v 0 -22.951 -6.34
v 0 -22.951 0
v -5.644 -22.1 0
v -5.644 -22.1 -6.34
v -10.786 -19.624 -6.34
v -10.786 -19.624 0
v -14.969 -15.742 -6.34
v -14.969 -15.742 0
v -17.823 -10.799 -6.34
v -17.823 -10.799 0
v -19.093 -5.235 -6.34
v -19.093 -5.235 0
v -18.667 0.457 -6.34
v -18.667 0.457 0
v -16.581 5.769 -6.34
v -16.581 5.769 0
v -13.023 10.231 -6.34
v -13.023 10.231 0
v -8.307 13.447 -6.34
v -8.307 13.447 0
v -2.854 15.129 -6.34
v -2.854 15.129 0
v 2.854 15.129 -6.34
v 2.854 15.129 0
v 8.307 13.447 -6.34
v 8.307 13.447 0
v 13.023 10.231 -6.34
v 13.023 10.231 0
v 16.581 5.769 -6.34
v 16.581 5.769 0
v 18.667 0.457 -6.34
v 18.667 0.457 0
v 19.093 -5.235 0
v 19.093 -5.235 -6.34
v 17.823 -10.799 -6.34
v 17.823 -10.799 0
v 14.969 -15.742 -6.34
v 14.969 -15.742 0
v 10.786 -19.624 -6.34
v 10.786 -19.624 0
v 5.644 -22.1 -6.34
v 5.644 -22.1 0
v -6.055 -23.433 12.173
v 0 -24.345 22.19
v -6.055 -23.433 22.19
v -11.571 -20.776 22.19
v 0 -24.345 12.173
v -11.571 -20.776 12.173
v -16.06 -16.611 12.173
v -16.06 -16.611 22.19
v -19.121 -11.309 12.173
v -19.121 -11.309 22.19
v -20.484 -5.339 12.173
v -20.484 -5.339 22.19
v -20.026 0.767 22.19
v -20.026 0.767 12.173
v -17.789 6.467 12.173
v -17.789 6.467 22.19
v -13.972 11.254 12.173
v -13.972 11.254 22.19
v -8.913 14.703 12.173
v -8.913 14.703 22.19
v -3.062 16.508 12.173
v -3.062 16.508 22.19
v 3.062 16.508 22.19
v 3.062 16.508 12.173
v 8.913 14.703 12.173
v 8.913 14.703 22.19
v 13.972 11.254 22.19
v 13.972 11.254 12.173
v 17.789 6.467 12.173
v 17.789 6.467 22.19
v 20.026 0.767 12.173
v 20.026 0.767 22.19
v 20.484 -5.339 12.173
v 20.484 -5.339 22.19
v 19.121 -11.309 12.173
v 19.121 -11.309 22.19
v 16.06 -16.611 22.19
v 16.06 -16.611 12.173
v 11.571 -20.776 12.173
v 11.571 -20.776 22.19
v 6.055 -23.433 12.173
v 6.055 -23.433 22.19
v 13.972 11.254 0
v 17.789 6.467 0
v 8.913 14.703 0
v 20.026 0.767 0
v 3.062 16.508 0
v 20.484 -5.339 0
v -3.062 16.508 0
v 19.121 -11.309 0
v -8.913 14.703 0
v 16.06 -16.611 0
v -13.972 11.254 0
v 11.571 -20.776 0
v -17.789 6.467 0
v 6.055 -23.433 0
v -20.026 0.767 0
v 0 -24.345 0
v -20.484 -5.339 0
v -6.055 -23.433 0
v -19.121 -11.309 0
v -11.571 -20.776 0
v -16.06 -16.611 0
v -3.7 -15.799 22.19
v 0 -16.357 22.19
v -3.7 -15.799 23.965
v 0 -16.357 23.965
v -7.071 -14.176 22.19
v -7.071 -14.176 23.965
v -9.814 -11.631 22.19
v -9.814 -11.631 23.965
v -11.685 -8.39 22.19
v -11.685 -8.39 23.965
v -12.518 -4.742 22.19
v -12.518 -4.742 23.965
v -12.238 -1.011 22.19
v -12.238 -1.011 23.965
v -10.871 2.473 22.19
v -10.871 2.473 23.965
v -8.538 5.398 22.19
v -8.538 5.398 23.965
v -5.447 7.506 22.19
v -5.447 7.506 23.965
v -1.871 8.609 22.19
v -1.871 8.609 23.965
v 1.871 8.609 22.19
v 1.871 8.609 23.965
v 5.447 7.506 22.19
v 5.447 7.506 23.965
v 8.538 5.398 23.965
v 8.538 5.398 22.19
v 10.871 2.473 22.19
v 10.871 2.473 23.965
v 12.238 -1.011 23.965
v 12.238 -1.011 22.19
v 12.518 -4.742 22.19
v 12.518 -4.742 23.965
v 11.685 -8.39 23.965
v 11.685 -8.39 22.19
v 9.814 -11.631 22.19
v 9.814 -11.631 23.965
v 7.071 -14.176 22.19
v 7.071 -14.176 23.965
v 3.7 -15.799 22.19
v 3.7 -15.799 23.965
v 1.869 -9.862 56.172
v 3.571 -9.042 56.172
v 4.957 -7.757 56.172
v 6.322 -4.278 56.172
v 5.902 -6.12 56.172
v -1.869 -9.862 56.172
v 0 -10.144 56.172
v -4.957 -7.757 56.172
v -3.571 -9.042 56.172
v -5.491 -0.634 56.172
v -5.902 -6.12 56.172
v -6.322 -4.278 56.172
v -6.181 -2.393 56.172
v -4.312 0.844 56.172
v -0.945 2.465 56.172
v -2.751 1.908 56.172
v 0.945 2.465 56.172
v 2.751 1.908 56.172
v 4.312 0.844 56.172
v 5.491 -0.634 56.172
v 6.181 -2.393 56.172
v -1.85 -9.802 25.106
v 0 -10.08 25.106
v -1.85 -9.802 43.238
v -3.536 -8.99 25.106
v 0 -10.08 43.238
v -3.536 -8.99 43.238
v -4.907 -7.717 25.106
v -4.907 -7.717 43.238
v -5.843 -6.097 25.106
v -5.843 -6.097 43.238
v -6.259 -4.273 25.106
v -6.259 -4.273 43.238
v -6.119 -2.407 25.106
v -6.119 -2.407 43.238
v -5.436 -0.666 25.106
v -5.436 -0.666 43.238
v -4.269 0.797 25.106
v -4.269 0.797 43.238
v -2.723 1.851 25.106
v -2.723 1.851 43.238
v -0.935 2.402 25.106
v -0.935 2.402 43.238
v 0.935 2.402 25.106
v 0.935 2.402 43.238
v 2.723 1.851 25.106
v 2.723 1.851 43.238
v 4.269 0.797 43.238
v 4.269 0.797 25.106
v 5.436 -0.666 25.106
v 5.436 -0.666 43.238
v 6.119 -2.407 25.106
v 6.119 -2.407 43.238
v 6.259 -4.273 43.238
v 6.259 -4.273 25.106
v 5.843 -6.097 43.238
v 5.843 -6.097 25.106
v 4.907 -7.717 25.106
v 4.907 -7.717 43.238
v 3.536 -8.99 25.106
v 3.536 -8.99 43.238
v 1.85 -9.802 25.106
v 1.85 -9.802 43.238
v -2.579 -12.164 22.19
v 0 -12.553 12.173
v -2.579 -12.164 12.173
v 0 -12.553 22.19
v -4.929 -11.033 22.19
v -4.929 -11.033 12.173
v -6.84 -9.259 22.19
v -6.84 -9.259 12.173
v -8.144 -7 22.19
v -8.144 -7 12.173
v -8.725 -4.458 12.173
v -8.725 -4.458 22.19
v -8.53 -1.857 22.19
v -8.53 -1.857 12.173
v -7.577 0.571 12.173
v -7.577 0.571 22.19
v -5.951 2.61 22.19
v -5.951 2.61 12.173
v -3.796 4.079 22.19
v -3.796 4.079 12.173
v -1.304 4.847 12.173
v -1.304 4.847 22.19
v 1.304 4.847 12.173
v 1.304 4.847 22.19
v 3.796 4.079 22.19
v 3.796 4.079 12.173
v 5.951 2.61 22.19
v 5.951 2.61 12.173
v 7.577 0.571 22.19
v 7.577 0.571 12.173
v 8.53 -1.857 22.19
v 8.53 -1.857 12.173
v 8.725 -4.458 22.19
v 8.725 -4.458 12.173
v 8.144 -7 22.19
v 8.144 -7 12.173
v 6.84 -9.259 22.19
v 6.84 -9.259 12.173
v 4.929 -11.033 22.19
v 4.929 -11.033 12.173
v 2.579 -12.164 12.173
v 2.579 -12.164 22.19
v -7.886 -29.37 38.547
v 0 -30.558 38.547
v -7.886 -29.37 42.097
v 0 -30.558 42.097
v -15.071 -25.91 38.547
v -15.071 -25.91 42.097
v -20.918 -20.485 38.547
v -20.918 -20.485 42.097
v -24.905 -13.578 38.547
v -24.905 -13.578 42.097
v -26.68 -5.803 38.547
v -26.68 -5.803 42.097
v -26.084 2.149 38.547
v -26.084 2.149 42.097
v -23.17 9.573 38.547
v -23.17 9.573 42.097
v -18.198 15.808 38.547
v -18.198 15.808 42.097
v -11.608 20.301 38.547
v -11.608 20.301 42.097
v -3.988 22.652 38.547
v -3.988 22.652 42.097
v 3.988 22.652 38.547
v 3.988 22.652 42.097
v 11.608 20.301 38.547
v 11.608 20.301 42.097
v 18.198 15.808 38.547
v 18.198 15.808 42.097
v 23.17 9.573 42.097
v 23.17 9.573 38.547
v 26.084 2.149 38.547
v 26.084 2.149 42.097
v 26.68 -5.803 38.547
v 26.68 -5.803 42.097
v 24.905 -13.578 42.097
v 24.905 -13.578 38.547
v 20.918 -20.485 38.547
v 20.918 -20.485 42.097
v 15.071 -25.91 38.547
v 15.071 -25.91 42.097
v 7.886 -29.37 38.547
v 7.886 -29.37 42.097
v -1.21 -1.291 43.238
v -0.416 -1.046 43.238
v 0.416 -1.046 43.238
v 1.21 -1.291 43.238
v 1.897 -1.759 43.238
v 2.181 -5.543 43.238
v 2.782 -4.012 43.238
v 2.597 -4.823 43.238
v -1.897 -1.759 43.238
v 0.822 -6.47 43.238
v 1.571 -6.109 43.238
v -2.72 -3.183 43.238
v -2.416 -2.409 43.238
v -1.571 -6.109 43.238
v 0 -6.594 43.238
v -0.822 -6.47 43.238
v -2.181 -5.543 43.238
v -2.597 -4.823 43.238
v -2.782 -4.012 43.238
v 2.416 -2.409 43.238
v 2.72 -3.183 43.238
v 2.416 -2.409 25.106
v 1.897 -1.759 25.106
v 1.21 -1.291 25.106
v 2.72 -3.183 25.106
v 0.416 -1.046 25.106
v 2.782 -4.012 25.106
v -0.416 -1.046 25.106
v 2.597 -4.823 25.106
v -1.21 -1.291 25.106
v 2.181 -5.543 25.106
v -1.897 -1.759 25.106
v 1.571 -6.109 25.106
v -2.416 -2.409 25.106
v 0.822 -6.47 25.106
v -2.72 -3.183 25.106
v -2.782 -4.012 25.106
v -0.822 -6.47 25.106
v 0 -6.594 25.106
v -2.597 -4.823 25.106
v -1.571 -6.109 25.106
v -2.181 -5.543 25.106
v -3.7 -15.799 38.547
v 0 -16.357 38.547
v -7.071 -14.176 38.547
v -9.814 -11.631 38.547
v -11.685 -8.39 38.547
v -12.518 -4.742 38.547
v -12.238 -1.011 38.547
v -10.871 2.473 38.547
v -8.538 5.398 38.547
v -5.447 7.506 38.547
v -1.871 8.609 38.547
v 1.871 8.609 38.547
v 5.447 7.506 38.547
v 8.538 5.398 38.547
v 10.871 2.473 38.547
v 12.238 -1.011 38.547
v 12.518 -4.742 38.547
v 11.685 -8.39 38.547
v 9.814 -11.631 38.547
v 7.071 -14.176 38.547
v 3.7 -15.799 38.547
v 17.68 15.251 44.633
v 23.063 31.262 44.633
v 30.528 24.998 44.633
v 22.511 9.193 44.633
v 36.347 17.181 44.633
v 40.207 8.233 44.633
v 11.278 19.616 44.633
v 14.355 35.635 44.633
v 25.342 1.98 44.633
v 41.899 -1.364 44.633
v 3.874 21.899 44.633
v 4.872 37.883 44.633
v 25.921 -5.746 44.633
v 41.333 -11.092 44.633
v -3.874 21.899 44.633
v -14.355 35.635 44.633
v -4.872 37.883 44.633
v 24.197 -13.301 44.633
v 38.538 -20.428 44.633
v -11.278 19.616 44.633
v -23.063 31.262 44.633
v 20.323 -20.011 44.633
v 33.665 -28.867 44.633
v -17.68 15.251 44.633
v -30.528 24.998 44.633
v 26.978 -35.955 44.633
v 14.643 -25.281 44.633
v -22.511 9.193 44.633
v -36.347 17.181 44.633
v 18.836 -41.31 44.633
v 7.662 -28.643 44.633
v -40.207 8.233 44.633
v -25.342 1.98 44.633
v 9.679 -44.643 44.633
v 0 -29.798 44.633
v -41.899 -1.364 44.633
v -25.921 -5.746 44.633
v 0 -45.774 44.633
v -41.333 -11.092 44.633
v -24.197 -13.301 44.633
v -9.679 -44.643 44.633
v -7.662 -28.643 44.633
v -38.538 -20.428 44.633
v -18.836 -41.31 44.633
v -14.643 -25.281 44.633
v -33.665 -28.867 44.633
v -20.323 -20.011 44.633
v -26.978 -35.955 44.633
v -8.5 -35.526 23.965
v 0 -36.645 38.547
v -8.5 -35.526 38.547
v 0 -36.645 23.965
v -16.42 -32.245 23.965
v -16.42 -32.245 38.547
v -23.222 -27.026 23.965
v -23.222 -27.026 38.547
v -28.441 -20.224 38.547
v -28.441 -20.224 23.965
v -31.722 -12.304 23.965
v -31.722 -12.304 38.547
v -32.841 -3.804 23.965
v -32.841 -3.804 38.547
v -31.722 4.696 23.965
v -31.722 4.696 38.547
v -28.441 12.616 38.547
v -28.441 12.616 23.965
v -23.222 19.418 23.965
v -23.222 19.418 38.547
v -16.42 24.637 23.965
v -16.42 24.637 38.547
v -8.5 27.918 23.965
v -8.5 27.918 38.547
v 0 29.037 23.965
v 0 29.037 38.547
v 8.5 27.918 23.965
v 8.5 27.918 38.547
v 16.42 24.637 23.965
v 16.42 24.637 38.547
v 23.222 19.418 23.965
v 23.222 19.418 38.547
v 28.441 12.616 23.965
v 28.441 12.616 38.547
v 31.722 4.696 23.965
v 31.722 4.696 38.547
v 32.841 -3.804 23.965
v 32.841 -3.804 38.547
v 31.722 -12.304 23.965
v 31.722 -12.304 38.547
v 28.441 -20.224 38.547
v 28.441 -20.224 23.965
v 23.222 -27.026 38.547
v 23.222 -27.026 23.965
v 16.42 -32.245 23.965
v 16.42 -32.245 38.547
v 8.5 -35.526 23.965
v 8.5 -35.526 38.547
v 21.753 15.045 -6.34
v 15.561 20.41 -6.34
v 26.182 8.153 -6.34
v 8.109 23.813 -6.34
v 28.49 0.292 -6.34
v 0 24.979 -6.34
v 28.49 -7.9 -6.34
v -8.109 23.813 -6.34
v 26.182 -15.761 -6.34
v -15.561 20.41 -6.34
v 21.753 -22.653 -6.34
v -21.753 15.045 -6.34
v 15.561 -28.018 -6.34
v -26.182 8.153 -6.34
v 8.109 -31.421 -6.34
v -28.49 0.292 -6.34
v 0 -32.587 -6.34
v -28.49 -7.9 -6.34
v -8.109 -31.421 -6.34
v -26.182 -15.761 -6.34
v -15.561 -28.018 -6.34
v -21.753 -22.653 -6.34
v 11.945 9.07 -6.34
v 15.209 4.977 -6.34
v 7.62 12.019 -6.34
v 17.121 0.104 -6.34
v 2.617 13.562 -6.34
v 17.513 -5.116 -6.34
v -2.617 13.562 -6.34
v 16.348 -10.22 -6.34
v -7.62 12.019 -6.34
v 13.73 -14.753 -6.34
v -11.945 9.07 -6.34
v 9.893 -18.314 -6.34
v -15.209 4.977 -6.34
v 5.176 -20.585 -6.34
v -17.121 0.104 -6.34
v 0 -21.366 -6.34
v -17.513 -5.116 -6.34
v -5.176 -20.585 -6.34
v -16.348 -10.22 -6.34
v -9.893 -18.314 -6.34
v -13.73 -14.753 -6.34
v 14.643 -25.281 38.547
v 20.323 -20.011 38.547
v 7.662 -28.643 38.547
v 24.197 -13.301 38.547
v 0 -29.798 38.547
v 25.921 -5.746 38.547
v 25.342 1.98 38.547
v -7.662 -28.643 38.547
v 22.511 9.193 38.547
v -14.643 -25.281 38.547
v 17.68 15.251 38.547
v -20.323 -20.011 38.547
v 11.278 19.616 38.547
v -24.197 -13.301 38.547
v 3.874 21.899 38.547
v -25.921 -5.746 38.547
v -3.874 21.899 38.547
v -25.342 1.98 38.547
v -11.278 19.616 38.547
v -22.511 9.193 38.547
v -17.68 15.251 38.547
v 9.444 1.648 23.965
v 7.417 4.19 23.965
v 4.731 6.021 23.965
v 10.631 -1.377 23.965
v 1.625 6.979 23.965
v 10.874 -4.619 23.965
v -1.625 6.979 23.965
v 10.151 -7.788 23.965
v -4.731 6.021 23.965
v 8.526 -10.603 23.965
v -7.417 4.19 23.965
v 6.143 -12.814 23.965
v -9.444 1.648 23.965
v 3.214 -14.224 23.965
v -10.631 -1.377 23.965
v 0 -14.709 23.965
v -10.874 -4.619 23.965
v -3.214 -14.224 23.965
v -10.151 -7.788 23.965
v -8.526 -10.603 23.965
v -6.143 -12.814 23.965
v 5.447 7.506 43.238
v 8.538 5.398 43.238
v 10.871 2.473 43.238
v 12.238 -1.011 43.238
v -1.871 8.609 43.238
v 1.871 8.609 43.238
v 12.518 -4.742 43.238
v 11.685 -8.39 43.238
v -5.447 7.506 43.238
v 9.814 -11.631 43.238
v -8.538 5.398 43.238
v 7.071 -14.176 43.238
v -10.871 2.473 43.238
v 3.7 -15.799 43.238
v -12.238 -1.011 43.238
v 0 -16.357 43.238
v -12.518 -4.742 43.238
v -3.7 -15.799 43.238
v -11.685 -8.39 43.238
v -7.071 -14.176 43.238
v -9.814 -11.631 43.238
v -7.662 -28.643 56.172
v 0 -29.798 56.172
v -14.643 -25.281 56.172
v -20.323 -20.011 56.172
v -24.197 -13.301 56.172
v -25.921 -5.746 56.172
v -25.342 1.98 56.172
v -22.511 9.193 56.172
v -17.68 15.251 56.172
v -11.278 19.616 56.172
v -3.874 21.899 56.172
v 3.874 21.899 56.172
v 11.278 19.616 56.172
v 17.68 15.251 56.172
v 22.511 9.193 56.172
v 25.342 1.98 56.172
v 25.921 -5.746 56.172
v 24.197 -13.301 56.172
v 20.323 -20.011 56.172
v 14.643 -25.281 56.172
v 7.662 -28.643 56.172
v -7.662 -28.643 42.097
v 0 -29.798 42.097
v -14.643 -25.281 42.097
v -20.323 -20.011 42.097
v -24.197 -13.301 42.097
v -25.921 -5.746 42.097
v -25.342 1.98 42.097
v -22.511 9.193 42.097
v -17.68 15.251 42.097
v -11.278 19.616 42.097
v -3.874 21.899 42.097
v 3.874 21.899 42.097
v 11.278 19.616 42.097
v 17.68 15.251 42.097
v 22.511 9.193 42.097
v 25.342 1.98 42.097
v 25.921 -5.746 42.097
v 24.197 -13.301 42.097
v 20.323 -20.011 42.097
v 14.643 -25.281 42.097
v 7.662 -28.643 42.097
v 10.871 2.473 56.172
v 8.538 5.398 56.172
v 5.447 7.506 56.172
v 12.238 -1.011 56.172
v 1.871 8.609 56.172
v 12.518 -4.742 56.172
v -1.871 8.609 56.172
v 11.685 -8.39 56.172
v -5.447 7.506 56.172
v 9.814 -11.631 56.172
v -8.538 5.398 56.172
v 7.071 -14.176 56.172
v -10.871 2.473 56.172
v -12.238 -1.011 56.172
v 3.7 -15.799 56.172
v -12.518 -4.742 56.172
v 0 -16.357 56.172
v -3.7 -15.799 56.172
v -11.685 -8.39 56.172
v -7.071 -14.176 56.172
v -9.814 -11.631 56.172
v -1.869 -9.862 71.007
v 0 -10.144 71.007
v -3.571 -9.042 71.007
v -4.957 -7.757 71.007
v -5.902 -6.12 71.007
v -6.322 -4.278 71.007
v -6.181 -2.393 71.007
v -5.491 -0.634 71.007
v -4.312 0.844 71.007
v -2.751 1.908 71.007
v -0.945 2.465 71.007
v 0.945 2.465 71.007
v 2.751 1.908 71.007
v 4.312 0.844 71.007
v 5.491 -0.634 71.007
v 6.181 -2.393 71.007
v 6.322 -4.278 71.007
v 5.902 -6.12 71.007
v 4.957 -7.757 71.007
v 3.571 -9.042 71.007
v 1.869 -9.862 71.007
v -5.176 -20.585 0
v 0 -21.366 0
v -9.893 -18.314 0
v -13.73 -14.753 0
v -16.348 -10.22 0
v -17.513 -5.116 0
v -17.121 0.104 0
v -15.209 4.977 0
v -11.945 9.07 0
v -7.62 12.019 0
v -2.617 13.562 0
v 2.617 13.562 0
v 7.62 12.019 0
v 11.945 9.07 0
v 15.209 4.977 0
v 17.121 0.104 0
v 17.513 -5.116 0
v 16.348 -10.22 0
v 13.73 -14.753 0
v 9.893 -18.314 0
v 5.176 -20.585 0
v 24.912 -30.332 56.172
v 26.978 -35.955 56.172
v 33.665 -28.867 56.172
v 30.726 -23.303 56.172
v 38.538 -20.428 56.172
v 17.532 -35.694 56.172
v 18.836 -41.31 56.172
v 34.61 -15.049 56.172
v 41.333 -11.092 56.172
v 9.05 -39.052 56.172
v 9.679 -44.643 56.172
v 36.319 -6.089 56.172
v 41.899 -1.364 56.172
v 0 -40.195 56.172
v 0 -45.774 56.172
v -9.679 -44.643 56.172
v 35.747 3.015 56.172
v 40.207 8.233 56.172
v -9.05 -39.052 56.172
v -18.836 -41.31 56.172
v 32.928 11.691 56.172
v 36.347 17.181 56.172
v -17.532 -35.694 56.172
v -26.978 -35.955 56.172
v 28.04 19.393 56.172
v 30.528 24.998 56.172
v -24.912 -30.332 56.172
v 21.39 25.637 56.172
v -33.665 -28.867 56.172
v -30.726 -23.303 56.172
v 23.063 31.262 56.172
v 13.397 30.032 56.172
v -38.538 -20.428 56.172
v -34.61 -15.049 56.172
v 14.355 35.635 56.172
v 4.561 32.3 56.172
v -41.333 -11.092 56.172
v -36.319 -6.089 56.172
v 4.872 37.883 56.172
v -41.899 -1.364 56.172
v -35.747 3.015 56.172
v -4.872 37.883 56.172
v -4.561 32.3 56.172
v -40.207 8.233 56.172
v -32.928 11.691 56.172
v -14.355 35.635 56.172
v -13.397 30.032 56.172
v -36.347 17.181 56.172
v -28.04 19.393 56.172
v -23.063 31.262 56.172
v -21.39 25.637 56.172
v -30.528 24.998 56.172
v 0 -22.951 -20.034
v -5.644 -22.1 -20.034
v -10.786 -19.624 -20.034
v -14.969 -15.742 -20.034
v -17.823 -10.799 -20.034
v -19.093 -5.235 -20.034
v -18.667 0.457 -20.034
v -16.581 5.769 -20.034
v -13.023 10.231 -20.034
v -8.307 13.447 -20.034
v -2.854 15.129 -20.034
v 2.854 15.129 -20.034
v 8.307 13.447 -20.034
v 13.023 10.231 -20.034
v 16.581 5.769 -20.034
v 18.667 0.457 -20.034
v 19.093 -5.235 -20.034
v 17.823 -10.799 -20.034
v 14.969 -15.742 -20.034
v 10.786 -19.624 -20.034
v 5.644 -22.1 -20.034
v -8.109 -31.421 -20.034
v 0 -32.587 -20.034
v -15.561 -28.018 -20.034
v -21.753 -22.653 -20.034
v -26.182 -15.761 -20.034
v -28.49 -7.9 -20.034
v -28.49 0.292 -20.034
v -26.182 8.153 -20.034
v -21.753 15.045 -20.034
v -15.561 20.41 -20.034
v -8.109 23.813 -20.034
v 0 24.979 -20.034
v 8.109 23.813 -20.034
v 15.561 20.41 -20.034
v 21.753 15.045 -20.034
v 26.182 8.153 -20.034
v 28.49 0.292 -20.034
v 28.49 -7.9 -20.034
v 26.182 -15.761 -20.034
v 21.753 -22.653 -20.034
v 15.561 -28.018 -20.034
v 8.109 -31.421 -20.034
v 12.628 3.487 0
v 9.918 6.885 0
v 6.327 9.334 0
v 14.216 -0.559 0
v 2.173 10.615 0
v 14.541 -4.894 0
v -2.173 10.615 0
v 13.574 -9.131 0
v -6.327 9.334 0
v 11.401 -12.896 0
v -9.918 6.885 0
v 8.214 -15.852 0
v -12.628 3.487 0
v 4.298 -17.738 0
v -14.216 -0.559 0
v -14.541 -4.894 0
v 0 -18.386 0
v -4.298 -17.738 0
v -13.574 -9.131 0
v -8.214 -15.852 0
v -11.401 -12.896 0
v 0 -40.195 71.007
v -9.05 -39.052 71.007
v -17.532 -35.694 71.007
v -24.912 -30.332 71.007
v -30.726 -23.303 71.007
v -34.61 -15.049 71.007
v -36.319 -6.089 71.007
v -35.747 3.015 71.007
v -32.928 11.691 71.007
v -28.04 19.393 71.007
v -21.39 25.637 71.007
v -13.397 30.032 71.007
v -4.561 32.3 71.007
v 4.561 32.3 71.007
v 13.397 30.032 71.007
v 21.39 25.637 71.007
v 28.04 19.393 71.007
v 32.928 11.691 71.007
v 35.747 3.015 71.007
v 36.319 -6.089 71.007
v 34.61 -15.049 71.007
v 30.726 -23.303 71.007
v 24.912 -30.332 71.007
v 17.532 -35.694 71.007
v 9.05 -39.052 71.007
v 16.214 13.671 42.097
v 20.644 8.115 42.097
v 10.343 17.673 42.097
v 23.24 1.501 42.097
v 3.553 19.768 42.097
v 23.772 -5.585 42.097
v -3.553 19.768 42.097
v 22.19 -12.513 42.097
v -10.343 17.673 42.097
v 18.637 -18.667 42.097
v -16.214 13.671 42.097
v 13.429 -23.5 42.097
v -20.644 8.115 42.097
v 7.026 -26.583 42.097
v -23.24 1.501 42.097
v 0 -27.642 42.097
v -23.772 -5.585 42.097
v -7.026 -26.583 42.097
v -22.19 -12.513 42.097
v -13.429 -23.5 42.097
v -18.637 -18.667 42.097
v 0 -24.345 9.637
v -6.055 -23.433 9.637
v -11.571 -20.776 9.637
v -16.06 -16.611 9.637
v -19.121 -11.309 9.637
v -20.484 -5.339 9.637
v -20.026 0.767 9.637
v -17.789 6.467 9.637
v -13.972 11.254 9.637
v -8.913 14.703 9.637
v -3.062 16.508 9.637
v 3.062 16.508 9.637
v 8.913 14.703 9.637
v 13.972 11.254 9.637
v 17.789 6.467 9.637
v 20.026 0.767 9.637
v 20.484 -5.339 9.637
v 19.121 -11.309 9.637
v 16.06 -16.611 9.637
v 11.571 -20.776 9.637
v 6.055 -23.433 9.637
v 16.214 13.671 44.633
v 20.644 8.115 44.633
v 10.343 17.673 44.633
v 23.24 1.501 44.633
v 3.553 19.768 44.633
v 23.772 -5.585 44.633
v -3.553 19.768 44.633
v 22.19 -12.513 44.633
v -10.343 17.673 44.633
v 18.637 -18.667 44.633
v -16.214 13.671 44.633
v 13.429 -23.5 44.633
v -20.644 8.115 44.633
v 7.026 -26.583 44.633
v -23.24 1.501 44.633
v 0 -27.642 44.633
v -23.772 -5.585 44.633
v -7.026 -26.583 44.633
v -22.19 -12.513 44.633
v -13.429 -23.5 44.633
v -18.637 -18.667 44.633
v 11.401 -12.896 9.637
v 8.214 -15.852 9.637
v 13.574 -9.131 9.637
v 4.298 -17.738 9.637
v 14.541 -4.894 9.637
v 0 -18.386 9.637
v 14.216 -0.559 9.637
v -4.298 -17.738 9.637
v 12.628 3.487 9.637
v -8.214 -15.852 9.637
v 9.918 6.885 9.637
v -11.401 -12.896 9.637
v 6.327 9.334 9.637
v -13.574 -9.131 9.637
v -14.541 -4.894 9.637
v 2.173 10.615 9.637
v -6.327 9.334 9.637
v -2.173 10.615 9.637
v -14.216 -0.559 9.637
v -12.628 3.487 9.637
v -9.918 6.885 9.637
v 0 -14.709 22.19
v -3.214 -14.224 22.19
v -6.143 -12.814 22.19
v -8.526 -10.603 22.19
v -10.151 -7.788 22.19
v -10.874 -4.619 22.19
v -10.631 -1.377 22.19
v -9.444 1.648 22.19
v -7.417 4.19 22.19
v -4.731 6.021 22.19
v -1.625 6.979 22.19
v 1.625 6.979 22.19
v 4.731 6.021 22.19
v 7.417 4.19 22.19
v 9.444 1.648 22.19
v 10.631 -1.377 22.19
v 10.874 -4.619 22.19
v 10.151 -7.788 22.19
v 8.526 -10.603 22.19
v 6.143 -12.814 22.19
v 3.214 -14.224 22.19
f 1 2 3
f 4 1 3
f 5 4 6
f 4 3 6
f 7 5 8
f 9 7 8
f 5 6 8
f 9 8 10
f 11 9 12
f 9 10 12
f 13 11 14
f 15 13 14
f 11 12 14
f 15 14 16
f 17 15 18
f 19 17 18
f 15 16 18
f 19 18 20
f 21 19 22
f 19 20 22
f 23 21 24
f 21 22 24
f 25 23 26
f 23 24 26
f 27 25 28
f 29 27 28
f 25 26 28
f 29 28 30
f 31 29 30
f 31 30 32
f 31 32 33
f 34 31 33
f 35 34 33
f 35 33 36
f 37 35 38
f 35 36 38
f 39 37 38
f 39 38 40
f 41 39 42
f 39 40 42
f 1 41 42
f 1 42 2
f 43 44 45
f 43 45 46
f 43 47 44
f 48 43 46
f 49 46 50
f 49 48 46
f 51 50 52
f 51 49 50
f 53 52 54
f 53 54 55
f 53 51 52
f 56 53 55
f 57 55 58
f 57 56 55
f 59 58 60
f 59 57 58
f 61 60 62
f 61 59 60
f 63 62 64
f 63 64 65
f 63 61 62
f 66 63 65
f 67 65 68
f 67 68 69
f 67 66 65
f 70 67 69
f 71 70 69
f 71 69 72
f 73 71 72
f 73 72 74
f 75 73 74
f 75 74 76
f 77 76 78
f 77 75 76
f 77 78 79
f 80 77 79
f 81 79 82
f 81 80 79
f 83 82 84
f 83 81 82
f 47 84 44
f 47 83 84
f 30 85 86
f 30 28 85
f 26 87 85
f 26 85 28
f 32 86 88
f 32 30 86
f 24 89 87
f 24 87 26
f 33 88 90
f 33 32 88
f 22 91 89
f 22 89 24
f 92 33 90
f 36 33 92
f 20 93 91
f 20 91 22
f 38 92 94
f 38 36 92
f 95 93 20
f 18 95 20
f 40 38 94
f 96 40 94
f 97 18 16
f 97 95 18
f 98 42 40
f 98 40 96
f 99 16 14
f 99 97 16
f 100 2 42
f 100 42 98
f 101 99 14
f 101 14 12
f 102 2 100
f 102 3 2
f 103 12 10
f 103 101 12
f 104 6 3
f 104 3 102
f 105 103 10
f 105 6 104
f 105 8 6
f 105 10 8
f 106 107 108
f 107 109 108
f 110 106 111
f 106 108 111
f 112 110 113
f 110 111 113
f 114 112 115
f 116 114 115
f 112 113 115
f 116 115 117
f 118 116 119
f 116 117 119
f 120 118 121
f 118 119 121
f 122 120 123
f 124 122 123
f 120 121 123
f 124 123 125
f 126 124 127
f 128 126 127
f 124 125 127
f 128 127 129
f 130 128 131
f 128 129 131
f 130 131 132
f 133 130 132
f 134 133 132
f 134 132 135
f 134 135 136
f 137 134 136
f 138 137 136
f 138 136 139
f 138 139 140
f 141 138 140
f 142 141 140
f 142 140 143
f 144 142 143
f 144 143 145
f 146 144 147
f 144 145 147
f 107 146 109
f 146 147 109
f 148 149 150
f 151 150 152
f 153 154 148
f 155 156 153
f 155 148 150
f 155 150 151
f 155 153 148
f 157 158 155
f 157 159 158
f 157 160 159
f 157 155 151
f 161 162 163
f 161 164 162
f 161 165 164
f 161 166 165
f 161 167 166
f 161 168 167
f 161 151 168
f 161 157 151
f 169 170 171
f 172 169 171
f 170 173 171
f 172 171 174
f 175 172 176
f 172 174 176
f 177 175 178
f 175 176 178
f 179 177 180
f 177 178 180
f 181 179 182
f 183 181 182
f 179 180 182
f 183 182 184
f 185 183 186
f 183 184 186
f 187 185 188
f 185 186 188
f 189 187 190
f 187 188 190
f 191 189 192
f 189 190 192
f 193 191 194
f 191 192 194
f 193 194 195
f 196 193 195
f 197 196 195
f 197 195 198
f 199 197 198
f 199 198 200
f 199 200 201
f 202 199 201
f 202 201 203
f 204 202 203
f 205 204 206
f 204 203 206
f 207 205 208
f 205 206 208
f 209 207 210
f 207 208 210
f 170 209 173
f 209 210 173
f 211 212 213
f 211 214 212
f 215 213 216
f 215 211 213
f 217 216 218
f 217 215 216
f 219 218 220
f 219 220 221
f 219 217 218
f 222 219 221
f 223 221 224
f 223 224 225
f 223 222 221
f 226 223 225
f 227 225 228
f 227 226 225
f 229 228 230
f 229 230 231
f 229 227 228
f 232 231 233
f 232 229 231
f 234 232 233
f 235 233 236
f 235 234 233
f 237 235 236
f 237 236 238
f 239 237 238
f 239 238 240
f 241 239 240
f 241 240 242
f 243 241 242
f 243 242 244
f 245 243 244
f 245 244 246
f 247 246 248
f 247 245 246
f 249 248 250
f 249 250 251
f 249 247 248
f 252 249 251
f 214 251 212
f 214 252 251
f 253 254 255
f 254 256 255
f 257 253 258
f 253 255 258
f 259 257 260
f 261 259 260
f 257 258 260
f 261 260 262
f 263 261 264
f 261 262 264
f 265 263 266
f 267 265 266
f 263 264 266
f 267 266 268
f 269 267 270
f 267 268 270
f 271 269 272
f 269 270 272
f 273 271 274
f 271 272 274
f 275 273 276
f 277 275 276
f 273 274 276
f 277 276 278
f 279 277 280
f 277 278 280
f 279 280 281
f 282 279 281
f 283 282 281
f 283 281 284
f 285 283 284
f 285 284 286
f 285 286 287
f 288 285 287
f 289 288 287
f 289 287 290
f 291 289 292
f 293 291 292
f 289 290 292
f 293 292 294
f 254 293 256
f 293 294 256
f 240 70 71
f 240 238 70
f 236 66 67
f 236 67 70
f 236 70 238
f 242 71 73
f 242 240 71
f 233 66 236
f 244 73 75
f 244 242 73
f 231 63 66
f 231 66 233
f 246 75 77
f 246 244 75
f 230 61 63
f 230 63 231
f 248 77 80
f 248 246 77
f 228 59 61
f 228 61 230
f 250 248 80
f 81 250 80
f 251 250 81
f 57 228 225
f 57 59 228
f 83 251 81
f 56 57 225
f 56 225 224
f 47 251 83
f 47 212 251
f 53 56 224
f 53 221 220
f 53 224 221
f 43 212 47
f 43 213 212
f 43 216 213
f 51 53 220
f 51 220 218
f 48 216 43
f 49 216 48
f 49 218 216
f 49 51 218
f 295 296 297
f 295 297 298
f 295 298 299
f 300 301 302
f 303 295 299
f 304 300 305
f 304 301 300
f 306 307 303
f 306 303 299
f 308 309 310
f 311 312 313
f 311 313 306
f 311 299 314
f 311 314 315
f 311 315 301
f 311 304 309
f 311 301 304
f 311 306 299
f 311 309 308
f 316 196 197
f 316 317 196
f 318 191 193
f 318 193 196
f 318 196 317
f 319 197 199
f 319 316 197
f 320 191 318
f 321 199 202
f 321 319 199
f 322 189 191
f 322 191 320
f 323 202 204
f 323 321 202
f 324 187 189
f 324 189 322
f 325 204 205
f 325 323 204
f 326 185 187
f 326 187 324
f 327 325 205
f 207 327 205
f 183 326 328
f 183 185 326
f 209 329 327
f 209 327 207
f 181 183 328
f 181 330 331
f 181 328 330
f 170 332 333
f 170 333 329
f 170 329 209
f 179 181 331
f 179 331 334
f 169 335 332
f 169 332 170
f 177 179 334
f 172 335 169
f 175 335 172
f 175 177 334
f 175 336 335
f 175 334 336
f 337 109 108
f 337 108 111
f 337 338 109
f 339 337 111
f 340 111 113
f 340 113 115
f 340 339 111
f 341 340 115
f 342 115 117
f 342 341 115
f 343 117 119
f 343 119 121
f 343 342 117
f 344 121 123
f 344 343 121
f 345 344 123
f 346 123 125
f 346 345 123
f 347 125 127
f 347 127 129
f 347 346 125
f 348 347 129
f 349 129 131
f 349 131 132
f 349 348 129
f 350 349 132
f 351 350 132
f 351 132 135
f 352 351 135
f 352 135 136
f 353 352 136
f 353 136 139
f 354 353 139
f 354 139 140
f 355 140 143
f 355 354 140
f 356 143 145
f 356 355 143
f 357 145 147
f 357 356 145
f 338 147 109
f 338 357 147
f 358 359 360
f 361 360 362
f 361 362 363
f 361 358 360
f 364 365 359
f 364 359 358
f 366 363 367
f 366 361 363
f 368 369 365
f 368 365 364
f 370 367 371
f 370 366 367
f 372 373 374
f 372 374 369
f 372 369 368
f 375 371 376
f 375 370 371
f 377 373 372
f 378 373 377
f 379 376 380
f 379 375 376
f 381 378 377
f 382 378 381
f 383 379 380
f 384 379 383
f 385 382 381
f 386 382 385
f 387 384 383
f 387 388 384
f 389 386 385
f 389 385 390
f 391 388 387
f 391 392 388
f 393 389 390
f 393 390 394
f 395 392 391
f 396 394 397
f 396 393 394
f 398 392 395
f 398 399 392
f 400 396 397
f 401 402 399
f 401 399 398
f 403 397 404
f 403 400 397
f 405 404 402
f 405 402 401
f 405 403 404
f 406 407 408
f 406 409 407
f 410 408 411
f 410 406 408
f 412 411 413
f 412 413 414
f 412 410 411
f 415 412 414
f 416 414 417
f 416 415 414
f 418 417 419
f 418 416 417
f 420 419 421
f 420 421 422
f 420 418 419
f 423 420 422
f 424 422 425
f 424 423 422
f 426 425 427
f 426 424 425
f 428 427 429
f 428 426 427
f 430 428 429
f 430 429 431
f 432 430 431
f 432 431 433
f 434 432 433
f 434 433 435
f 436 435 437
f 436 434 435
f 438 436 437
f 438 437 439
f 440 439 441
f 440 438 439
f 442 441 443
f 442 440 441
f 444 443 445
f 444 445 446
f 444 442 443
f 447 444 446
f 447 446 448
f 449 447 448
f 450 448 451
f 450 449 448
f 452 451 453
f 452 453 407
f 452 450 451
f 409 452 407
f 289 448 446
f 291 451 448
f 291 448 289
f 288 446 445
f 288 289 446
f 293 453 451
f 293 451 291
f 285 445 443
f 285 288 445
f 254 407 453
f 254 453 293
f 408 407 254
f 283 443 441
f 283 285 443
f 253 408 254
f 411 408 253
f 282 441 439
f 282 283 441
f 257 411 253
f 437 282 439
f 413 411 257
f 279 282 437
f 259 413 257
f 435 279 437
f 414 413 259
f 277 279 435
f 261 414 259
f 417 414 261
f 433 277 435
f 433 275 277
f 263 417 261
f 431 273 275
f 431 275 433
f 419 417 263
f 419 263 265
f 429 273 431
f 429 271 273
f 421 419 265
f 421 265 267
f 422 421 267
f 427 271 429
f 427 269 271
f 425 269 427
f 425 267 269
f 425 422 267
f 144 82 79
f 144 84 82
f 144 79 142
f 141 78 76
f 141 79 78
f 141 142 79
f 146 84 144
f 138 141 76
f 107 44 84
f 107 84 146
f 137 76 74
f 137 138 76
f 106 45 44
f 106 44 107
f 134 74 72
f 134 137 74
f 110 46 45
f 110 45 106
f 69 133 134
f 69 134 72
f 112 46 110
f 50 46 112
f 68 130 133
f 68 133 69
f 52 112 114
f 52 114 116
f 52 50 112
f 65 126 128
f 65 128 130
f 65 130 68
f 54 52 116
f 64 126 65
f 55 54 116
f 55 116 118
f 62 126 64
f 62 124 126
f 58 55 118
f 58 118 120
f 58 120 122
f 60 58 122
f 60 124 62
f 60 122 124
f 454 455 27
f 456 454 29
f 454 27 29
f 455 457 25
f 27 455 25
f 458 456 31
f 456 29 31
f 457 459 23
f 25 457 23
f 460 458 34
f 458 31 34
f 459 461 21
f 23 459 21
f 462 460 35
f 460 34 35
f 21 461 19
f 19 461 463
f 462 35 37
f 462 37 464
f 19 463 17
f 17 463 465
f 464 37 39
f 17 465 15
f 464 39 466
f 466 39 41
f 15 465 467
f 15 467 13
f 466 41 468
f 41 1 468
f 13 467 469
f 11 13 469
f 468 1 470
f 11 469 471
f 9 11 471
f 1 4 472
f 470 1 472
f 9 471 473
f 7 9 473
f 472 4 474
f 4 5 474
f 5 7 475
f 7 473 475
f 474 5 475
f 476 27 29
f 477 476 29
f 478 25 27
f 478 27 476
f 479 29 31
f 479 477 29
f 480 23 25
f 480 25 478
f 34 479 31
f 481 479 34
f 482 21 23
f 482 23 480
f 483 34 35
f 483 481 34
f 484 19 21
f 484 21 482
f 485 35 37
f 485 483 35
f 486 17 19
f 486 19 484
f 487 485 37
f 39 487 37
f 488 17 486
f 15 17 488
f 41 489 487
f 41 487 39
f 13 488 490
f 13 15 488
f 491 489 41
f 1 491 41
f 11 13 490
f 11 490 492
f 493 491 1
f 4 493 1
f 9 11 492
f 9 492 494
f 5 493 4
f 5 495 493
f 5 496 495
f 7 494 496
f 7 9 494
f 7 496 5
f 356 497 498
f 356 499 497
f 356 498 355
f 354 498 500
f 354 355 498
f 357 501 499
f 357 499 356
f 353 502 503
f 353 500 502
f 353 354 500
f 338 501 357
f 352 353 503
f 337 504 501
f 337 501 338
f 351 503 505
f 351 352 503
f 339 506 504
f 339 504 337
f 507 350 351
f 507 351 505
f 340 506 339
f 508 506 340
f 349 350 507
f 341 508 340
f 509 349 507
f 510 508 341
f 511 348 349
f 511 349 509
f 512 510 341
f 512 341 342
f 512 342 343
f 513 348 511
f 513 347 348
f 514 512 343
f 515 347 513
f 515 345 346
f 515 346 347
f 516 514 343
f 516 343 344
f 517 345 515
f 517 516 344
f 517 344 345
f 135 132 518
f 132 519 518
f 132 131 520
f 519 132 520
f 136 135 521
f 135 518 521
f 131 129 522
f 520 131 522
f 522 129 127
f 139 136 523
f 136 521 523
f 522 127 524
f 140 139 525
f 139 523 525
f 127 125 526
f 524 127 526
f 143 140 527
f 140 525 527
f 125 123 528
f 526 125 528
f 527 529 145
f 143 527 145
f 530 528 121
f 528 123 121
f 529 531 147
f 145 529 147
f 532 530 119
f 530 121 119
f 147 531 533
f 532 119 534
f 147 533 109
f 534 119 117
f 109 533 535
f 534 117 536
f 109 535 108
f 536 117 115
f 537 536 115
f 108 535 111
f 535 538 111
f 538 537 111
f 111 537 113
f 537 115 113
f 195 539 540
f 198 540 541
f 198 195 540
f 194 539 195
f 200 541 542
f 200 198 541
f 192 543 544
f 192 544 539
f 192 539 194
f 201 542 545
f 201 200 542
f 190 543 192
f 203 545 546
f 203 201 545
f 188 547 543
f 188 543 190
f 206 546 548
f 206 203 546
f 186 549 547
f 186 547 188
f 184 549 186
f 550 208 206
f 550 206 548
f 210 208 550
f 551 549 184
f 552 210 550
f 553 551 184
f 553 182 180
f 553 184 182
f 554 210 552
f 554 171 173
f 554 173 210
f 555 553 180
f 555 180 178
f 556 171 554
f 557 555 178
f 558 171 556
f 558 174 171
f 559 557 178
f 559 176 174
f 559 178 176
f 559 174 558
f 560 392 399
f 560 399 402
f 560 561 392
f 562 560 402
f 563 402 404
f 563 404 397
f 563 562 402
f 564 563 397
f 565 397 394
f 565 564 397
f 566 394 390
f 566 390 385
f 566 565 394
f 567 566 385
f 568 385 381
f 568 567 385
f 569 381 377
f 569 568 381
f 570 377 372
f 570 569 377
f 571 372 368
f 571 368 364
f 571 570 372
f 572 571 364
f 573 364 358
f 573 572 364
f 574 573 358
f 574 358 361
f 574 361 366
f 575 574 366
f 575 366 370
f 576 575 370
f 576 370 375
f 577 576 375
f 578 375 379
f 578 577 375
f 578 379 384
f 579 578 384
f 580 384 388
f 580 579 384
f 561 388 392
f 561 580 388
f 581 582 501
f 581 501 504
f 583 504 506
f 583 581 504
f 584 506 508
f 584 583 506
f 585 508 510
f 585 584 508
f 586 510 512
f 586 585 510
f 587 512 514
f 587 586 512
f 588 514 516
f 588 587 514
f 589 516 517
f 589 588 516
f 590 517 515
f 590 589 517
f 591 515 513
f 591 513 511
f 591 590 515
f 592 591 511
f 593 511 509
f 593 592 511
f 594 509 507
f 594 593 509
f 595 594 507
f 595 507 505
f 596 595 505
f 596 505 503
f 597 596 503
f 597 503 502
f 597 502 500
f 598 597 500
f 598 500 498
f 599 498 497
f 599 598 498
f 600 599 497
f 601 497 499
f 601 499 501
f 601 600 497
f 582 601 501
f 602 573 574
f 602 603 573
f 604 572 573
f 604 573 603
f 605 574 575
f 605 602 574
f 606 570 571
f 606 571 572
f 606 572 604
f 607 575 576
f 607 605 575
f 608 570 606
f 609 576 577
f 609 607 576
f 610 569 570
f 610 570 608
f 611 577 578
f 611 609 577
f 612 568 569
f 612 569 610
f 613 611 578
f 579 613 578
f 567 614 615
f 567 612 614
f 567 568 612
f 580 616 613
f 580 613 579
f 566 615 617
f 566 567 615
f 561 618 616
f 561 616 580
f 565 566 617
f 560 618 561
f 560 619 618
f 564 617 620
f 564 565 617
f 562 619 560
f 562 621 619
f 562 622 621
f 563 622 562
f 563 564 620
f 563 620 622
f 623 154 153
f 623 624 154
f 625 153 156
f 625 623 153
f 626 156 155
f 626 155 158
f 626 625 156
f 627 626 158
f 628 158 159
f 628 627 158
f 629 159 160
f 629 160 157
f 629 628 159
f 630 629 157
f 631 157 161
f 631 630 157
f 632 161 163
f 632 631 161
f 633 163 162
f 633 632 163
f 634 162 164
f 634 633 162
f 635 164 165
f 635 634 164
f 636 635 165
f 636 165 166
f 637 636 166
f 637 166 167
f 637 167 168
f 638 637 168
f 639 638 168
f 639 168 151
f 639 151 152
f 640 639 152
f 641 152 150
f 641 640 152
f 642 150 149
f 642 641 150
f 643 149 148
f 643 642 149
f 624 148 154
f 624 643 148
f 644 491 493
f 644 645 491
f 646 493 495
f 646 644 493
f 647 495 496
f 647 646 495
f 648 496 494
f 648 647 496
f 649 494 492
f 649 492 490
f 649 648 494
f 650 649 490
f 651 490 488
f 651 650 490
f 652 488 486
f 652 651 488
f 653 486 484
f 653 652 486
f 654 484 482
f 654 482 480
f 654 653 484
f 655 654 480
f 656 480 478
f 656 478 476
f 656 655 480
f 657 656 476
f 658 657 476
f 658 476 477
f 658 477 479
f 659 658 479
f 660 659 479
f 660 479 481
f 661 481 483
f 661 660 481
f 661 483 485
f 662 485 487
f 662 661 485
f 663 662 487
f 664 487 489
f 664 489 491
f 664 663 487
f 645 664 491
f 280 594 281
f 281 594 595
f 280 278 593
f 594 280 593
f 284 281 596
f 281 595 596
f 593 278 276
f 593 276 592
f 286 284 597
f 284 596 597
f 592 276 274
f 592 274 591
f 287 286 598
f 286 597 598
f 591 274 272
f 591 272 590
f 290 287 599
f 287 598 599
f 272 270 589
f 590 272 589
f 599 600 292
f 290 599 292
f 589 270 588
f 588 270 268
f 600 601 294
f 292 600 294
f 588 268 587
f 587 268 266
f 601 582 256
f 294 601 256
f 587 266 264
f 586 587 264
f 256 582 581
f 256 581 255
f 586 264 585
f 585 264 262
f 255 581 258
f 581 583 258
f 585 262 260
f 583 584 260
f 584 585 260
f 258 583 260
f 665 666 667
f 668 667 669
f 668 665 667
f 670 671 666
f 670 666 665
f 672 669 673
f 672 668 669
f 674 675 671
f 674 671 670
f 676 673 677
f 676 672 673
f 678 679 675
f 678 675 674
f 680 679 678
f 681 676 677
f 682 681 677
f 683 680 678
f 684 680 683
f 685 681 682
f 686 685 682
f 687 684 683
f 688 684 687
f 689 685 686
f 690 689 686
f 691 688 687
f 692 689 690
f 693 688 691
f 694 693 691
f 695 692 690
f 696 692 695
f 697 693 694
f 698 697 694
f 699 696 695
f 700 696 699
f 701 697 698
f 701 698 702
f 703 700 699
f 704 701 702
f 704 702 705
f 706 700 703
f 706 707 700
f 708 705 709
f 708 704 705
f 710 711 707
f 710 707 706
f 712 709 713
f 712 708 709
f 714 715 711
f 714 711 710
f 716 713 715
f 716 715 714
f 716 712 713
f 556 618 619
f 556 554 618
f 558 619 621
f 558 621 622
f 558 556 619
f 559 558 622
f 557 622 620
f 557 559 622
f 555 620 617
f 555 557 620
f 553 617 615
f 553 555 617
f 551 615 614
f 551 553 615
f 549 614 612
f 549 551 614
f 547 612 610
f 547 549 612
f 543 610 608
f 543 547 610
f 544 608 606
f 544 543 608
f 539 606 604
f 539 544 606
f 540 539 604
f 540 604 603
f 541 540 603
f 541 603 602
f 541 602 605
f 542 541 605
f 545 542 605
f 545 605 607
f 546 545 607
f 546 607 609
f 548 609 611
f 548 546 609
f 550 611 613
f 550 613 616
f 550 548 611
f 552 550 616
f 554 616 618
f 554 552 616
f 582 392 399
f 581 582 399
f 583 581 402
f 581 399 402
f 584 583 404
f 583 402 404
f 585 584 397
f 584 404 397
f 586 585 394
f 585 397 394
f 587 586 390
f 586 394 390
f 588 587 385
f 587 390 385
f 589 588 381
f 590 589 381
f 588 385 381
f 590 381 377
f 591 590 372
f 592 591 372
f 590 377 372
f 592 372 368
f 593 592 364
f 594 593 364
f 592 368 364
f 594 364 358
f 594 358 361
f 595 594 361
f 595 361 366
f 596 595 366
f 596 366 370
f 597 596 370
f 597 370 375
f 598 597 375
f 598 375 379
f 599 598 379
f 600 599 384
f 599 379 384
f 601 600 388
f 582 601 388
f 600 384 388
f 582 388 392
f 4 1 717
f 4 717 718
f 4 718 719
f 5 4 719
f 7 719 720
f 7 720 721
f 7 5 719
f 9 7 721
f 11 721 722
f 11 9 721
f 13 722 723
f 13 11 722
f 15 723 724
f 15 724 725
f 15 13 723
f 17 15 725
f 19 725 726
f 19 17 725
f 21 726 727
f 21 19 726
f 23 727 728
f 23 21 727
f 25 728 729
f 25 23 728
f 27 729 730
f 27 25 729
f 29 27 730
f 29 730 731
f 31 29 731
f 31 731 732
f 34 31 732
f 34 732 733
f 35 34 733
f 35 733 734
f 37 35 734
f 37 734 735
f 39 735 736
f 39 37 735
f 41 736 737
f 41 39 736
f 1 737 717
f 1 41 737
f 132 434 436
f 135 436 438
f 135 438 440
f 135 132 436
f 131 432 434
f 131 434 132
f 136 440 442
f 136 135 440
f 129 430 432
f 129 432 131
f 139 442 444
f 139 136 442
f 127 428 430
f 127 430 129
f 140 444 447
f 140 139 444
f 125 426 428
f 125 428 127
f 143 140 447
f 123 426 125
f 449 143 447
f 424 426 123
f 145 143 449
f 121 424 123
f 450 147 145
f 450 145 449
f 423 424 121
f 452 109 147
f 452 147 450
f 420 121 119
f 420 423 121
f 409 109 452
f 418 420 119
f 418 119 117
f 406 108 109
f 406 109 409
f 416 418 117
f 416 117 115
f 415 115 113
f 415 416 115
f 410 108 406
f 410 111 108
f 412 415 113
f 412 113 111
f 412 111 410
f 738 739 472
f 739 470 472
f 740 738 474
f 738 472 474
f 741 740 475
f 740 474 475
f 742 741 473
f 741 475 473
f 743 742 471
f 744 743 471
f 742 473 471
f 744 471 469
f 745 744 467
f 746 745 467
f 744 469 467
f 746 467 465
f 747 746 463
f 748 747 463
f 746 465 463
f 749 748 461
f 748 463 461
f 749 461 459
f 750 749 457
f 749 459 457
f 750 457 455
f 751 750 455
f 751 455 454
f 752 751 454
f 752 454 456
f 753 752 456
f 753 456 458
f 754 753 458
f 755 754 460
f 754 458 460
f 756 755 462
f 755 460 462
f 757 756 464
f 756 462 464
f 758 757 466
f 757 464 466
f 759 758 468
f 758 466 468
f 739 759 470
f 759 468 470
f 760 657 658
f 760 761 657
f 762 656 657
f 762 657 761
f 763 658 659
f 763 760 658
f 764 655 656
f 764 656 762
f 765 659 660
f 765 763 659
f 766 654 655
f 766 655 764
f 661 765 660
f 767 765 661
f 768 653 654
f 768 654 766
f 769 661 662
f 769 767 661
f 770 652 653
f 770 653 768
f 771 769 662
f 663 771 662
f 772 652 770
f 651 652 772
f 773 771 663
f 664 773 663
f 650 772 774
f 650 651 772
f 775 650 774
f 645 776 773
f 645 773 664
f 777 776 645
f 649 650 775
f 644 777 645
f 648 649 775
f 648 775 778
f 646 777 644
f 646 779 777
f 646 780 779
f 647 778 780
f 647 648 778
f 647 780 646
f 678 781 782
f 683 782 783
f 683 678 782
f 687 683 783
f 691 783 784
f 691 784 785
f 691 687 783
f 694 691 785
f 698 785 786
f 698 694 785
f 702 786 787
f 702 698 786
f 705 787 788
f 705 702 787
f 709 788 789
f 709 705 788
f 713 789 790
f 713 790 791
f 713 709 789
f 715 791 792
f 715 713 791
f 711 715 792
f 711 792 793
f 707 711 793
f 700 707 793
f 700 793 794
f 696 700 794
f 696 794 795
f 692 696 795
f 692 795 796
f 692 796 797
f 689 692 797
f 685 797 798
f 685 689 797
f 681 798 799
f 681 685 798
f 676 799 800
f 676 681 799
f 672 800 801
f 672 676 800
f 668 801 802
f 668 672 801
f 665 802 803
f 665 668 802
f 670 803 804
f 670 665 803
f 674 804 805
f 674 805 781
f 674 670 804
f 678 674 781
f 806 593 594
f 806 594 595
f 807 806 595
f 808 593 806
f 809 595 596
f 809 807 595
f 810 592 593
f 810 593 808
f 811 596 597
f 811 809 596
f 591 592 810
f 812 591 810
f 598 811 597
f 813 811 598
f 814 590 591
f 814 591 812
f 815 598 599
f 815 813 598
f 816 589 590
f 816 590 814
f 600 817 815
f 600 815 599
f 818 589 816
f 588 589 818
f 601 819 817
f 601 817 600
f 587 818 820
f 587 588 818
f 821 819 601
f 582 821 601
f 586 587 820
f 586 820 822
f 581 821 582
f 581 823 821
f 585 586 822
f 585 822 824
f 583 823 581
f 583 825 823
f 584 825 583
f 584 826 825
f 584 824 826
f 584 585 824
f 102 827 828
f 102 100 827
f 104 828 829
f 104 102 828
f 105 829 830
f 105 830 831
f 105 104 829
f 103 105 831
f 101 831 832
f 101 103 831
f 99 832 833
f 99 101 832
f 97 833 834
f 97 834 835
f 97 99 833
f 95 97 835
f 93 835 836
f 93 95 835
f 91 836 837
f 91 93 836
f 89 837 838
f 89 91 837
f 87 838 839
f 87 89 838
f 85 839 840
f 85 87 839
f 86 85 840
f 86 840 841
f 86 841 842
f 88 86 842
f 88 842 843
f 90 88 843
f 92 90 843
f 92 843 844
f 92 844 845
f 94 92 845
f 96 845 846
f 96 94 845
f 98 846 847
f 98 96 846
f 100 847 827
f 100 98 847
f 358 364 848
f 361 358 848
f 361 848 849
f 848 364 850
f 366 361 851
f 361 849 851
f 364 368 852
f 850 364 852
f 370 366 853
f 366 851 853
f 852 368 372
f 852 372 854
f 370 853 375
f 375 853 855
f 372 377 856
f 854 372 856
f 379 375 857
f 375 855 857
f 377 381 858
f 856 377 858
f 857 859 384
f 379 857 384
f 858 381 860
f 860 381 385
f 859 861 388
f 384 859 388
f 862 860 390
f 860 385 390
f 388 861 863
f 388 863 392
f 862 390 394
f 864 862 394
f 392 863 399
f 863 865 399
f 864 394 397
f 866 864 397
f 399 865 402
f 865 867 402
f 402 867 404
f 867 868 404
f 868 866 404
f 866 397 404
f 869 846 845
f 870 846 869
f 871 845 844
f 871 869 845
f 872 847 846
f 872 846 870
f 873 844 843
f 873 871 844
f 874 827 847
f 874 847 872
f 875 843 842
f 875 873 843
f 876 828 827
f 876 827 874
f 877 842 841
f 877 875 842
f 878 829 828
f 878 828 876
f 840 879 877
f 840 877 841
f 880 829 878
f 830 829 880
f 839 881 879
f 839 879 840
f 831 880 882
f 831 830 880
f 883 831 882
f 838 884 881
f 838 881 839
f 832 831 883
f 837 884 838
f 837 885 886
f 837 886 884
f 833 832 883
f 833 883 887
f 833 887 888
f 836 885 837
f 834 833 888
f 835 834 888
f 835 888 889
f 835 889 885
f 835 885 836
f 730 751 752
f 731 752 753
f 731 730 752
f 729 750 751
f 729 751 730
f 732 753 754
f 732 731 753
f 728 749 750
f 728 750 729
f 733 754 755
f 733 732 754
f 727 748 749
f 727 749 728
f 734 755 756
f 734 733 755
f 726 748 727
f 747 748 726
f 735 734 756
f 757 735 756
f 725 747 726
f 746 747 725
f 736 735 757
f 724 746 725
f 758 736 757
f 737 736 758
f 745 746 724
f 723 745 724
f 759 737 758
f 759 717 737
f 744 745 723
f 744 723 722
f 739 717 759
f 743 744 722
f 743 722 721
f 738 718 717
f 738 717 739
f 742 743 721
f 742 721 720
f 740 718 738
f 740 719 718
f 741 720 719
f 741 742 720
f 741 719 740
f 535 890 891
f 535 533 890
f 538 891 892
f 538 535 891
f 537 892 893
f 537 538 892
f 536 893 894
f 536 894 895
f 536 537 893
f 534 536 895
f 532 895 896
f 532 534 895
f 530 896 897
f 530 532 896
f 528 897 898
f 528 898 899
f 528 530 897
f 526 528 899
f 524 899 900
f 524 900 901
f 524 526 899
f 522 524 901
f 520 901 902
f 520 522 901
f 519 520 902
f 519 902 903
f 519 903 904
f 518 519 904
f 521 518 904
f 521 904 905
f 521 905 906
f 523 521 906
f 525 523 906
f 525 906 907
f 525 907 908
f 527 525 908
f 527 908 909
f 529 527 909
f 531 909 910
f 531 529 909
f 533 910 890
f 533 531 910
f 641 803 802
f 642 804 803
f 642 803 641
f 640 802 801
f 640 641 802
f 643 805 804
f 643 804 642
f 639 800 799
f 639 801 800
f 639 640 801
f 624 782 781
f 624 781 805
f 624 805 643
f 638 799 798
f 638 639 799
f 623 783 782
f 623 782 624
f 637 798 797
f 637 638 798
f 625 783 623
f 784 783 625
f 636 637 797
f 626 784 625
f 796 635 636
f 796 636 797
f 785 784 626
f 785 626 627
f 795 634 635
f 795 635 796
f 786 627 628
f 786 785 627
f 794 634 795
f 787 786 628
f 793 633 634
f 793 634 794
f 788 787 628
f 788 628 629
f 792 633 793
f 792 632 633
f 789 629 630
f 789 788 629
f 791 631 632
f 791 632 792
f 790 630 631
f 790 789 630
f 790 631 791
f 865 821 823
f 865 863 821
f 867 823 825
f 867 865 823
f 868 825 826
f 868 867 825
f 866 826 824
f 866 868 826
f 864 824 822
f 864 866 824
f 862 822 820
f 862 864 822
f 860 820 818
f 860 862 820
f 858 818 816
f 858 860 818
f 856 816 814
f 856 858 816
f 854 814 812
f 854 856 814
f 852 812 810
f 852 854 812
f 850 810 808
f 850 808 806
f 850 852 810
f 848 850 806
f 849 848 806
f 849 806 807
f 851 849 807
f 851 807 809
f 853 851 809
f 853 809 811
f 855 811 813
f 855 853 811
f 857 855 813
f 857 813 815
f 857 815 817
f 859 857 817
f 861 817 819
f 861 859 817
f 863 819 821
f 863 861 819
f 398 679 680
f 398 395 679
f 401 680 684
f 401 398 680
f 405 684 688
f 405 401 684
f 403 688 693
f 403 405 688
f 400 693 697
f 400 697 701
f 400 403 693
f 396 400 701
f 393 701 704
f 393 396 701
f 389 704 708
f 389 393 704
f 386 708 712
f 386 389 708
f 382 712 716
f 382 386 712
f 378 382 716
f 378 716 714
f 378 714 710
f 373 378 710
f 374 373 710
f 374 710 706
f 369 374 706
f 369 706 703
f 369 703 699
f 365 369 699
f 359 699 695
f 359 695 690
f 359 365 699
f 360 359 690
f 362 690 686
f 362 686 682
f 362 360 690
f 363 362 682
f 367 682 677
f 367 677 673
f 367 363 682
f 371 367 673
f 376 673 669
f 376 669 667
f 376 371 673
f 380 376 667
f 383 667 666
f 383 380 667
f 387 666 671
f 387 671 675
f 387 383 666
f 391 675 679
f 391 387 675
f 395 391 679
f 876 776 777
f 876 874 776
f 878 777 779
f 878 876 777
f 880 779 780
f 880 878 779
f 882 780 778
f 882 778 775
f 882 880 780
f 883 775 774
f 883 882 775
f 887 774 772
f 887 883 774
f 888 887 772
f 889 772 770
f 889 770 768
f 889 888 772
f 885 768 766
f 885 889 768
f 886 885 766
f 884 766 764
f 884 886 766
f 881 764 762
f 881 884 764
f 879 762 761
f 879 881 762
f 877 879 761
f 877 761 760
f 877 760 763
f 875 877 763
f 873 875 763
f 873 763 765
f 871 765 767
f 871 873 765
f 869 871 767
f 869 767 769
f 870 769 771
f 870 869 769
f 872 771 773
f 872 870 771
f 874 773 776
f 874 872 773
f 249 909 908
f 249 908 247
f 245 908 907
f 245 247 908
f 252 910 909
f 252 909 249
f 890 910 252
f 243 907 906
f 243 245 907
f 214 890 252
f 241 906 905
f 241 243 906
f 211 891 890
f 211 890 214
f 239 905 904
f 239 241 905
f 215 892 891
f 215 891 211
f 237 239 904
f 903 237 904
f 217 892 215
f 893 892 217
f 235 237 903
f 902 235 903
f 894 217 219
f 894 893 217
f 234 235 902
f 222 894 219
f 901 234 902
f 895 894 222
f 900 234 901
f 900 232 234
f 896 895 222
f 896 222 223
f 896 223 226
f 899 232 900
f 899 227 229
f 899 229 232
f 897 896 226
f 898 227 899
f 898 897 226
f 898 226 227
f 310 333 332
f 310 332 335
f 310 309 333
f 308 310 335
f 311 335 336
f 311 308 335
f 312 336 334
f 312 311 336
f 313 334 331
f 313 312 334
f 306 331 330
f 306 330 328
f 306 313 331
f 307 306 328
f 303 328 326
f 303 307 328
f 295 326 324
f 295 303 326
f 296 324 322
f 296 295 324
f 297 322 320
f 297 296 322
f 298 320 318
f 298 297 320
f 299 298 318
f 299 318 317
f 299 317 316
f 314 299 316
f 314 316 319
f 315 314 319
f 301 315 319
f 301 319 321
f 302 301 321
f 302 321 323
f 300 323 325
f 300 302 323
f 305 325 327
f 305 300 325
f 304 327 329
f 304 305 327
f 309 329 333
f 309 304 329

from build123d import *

# Parameters (mm, degrees)
F0_W   = 9.636704
F0_H   = 13.694263
F0_W_2 = 2.15558
F0_H_2 = 2.535973
F0_W_3 = 1.584984
F0_H_3 = 6.339937
F0_W_4 = 1.648382
F0_H_4 = 1.775185
F0_W_5 = 0.76079
F0_H_5 = 3.550365
F0_W_6 = 3.486965
F0_H_6 = 18.132223


with BuildPart() as f1:
    # F0 (on Right) → F1 (revolve)
    with BuildSketch(Plane.YZ):
        with Locations((-27.768923, -13.187068)):
            Rectangle(F0_W, F0_H)
        Polygon((-45.774341, 44.633154), (-29.797703, 44.633154), (-29.797703, 56.171838), (-40.195201, 56.171838), (-45.774341, 56.171838), align=None)
        with Locations((-28.719913, 43.365167)):
            Rectangle(F0_W_2, F0_H_2)
        Polygon((-36.644835, 23.964962), (-16.357036, 23.964962), (-16.357036, 38.546816), (-29.797703, 38.546816), (-30.558493, 38.546816), (-36.644835, 38.546816), align=None)
        Polygon((-24.345357, 22.189777), (-24.345357, 12.172678), (-12.553074, 12.172678), (-12.553074, 22.189777), (-14.708654, 22.189777), (-16.357036, 22.189777), align=None)
        Polygon((-21.365587, 0), (-18.385816, 0), (-18.385816, 9.636704), (-24.345357, 9.636704), (-24.345357, 0), (-22.950571, 0), align=None)
        with Locations((-22.158079, -3.169968)):
            Rectangle(F0_W_3, F0_H_3)
        with Locations((-15.532845, 23.077369)):
            Rectangle(F0_W_4, F0_H_4)
        with Locations((-30.178098, 40.321998)):
            Rectangle(F0_W_5, F0_H_5)
        Polygon((-40.195201, 56.171838), (-29.797703, 56.171838), (-16.357036, 56.171838), (-10.143898, 56.171838), (-10.143898, 71.007289), (-40.195201, 71.007289), align=None)
        Polygon((-10.143898, 56.171838), (-16.357036, 56.171838), (-16.357036, 43.238372), (-10.080499, 43.238372), (-6.593534, 43.238372), (-3.803962, 43.238372), (-3.803962, 56.171838), align=None)
        with Locations((-8.337017, 34.172261)):
            Rectangle(F0_W_6, F0_H_6)
    revolve(axis=Axis((0, -3.803962, 49.705105), (0, 0, -1)))


solid = f1.part
